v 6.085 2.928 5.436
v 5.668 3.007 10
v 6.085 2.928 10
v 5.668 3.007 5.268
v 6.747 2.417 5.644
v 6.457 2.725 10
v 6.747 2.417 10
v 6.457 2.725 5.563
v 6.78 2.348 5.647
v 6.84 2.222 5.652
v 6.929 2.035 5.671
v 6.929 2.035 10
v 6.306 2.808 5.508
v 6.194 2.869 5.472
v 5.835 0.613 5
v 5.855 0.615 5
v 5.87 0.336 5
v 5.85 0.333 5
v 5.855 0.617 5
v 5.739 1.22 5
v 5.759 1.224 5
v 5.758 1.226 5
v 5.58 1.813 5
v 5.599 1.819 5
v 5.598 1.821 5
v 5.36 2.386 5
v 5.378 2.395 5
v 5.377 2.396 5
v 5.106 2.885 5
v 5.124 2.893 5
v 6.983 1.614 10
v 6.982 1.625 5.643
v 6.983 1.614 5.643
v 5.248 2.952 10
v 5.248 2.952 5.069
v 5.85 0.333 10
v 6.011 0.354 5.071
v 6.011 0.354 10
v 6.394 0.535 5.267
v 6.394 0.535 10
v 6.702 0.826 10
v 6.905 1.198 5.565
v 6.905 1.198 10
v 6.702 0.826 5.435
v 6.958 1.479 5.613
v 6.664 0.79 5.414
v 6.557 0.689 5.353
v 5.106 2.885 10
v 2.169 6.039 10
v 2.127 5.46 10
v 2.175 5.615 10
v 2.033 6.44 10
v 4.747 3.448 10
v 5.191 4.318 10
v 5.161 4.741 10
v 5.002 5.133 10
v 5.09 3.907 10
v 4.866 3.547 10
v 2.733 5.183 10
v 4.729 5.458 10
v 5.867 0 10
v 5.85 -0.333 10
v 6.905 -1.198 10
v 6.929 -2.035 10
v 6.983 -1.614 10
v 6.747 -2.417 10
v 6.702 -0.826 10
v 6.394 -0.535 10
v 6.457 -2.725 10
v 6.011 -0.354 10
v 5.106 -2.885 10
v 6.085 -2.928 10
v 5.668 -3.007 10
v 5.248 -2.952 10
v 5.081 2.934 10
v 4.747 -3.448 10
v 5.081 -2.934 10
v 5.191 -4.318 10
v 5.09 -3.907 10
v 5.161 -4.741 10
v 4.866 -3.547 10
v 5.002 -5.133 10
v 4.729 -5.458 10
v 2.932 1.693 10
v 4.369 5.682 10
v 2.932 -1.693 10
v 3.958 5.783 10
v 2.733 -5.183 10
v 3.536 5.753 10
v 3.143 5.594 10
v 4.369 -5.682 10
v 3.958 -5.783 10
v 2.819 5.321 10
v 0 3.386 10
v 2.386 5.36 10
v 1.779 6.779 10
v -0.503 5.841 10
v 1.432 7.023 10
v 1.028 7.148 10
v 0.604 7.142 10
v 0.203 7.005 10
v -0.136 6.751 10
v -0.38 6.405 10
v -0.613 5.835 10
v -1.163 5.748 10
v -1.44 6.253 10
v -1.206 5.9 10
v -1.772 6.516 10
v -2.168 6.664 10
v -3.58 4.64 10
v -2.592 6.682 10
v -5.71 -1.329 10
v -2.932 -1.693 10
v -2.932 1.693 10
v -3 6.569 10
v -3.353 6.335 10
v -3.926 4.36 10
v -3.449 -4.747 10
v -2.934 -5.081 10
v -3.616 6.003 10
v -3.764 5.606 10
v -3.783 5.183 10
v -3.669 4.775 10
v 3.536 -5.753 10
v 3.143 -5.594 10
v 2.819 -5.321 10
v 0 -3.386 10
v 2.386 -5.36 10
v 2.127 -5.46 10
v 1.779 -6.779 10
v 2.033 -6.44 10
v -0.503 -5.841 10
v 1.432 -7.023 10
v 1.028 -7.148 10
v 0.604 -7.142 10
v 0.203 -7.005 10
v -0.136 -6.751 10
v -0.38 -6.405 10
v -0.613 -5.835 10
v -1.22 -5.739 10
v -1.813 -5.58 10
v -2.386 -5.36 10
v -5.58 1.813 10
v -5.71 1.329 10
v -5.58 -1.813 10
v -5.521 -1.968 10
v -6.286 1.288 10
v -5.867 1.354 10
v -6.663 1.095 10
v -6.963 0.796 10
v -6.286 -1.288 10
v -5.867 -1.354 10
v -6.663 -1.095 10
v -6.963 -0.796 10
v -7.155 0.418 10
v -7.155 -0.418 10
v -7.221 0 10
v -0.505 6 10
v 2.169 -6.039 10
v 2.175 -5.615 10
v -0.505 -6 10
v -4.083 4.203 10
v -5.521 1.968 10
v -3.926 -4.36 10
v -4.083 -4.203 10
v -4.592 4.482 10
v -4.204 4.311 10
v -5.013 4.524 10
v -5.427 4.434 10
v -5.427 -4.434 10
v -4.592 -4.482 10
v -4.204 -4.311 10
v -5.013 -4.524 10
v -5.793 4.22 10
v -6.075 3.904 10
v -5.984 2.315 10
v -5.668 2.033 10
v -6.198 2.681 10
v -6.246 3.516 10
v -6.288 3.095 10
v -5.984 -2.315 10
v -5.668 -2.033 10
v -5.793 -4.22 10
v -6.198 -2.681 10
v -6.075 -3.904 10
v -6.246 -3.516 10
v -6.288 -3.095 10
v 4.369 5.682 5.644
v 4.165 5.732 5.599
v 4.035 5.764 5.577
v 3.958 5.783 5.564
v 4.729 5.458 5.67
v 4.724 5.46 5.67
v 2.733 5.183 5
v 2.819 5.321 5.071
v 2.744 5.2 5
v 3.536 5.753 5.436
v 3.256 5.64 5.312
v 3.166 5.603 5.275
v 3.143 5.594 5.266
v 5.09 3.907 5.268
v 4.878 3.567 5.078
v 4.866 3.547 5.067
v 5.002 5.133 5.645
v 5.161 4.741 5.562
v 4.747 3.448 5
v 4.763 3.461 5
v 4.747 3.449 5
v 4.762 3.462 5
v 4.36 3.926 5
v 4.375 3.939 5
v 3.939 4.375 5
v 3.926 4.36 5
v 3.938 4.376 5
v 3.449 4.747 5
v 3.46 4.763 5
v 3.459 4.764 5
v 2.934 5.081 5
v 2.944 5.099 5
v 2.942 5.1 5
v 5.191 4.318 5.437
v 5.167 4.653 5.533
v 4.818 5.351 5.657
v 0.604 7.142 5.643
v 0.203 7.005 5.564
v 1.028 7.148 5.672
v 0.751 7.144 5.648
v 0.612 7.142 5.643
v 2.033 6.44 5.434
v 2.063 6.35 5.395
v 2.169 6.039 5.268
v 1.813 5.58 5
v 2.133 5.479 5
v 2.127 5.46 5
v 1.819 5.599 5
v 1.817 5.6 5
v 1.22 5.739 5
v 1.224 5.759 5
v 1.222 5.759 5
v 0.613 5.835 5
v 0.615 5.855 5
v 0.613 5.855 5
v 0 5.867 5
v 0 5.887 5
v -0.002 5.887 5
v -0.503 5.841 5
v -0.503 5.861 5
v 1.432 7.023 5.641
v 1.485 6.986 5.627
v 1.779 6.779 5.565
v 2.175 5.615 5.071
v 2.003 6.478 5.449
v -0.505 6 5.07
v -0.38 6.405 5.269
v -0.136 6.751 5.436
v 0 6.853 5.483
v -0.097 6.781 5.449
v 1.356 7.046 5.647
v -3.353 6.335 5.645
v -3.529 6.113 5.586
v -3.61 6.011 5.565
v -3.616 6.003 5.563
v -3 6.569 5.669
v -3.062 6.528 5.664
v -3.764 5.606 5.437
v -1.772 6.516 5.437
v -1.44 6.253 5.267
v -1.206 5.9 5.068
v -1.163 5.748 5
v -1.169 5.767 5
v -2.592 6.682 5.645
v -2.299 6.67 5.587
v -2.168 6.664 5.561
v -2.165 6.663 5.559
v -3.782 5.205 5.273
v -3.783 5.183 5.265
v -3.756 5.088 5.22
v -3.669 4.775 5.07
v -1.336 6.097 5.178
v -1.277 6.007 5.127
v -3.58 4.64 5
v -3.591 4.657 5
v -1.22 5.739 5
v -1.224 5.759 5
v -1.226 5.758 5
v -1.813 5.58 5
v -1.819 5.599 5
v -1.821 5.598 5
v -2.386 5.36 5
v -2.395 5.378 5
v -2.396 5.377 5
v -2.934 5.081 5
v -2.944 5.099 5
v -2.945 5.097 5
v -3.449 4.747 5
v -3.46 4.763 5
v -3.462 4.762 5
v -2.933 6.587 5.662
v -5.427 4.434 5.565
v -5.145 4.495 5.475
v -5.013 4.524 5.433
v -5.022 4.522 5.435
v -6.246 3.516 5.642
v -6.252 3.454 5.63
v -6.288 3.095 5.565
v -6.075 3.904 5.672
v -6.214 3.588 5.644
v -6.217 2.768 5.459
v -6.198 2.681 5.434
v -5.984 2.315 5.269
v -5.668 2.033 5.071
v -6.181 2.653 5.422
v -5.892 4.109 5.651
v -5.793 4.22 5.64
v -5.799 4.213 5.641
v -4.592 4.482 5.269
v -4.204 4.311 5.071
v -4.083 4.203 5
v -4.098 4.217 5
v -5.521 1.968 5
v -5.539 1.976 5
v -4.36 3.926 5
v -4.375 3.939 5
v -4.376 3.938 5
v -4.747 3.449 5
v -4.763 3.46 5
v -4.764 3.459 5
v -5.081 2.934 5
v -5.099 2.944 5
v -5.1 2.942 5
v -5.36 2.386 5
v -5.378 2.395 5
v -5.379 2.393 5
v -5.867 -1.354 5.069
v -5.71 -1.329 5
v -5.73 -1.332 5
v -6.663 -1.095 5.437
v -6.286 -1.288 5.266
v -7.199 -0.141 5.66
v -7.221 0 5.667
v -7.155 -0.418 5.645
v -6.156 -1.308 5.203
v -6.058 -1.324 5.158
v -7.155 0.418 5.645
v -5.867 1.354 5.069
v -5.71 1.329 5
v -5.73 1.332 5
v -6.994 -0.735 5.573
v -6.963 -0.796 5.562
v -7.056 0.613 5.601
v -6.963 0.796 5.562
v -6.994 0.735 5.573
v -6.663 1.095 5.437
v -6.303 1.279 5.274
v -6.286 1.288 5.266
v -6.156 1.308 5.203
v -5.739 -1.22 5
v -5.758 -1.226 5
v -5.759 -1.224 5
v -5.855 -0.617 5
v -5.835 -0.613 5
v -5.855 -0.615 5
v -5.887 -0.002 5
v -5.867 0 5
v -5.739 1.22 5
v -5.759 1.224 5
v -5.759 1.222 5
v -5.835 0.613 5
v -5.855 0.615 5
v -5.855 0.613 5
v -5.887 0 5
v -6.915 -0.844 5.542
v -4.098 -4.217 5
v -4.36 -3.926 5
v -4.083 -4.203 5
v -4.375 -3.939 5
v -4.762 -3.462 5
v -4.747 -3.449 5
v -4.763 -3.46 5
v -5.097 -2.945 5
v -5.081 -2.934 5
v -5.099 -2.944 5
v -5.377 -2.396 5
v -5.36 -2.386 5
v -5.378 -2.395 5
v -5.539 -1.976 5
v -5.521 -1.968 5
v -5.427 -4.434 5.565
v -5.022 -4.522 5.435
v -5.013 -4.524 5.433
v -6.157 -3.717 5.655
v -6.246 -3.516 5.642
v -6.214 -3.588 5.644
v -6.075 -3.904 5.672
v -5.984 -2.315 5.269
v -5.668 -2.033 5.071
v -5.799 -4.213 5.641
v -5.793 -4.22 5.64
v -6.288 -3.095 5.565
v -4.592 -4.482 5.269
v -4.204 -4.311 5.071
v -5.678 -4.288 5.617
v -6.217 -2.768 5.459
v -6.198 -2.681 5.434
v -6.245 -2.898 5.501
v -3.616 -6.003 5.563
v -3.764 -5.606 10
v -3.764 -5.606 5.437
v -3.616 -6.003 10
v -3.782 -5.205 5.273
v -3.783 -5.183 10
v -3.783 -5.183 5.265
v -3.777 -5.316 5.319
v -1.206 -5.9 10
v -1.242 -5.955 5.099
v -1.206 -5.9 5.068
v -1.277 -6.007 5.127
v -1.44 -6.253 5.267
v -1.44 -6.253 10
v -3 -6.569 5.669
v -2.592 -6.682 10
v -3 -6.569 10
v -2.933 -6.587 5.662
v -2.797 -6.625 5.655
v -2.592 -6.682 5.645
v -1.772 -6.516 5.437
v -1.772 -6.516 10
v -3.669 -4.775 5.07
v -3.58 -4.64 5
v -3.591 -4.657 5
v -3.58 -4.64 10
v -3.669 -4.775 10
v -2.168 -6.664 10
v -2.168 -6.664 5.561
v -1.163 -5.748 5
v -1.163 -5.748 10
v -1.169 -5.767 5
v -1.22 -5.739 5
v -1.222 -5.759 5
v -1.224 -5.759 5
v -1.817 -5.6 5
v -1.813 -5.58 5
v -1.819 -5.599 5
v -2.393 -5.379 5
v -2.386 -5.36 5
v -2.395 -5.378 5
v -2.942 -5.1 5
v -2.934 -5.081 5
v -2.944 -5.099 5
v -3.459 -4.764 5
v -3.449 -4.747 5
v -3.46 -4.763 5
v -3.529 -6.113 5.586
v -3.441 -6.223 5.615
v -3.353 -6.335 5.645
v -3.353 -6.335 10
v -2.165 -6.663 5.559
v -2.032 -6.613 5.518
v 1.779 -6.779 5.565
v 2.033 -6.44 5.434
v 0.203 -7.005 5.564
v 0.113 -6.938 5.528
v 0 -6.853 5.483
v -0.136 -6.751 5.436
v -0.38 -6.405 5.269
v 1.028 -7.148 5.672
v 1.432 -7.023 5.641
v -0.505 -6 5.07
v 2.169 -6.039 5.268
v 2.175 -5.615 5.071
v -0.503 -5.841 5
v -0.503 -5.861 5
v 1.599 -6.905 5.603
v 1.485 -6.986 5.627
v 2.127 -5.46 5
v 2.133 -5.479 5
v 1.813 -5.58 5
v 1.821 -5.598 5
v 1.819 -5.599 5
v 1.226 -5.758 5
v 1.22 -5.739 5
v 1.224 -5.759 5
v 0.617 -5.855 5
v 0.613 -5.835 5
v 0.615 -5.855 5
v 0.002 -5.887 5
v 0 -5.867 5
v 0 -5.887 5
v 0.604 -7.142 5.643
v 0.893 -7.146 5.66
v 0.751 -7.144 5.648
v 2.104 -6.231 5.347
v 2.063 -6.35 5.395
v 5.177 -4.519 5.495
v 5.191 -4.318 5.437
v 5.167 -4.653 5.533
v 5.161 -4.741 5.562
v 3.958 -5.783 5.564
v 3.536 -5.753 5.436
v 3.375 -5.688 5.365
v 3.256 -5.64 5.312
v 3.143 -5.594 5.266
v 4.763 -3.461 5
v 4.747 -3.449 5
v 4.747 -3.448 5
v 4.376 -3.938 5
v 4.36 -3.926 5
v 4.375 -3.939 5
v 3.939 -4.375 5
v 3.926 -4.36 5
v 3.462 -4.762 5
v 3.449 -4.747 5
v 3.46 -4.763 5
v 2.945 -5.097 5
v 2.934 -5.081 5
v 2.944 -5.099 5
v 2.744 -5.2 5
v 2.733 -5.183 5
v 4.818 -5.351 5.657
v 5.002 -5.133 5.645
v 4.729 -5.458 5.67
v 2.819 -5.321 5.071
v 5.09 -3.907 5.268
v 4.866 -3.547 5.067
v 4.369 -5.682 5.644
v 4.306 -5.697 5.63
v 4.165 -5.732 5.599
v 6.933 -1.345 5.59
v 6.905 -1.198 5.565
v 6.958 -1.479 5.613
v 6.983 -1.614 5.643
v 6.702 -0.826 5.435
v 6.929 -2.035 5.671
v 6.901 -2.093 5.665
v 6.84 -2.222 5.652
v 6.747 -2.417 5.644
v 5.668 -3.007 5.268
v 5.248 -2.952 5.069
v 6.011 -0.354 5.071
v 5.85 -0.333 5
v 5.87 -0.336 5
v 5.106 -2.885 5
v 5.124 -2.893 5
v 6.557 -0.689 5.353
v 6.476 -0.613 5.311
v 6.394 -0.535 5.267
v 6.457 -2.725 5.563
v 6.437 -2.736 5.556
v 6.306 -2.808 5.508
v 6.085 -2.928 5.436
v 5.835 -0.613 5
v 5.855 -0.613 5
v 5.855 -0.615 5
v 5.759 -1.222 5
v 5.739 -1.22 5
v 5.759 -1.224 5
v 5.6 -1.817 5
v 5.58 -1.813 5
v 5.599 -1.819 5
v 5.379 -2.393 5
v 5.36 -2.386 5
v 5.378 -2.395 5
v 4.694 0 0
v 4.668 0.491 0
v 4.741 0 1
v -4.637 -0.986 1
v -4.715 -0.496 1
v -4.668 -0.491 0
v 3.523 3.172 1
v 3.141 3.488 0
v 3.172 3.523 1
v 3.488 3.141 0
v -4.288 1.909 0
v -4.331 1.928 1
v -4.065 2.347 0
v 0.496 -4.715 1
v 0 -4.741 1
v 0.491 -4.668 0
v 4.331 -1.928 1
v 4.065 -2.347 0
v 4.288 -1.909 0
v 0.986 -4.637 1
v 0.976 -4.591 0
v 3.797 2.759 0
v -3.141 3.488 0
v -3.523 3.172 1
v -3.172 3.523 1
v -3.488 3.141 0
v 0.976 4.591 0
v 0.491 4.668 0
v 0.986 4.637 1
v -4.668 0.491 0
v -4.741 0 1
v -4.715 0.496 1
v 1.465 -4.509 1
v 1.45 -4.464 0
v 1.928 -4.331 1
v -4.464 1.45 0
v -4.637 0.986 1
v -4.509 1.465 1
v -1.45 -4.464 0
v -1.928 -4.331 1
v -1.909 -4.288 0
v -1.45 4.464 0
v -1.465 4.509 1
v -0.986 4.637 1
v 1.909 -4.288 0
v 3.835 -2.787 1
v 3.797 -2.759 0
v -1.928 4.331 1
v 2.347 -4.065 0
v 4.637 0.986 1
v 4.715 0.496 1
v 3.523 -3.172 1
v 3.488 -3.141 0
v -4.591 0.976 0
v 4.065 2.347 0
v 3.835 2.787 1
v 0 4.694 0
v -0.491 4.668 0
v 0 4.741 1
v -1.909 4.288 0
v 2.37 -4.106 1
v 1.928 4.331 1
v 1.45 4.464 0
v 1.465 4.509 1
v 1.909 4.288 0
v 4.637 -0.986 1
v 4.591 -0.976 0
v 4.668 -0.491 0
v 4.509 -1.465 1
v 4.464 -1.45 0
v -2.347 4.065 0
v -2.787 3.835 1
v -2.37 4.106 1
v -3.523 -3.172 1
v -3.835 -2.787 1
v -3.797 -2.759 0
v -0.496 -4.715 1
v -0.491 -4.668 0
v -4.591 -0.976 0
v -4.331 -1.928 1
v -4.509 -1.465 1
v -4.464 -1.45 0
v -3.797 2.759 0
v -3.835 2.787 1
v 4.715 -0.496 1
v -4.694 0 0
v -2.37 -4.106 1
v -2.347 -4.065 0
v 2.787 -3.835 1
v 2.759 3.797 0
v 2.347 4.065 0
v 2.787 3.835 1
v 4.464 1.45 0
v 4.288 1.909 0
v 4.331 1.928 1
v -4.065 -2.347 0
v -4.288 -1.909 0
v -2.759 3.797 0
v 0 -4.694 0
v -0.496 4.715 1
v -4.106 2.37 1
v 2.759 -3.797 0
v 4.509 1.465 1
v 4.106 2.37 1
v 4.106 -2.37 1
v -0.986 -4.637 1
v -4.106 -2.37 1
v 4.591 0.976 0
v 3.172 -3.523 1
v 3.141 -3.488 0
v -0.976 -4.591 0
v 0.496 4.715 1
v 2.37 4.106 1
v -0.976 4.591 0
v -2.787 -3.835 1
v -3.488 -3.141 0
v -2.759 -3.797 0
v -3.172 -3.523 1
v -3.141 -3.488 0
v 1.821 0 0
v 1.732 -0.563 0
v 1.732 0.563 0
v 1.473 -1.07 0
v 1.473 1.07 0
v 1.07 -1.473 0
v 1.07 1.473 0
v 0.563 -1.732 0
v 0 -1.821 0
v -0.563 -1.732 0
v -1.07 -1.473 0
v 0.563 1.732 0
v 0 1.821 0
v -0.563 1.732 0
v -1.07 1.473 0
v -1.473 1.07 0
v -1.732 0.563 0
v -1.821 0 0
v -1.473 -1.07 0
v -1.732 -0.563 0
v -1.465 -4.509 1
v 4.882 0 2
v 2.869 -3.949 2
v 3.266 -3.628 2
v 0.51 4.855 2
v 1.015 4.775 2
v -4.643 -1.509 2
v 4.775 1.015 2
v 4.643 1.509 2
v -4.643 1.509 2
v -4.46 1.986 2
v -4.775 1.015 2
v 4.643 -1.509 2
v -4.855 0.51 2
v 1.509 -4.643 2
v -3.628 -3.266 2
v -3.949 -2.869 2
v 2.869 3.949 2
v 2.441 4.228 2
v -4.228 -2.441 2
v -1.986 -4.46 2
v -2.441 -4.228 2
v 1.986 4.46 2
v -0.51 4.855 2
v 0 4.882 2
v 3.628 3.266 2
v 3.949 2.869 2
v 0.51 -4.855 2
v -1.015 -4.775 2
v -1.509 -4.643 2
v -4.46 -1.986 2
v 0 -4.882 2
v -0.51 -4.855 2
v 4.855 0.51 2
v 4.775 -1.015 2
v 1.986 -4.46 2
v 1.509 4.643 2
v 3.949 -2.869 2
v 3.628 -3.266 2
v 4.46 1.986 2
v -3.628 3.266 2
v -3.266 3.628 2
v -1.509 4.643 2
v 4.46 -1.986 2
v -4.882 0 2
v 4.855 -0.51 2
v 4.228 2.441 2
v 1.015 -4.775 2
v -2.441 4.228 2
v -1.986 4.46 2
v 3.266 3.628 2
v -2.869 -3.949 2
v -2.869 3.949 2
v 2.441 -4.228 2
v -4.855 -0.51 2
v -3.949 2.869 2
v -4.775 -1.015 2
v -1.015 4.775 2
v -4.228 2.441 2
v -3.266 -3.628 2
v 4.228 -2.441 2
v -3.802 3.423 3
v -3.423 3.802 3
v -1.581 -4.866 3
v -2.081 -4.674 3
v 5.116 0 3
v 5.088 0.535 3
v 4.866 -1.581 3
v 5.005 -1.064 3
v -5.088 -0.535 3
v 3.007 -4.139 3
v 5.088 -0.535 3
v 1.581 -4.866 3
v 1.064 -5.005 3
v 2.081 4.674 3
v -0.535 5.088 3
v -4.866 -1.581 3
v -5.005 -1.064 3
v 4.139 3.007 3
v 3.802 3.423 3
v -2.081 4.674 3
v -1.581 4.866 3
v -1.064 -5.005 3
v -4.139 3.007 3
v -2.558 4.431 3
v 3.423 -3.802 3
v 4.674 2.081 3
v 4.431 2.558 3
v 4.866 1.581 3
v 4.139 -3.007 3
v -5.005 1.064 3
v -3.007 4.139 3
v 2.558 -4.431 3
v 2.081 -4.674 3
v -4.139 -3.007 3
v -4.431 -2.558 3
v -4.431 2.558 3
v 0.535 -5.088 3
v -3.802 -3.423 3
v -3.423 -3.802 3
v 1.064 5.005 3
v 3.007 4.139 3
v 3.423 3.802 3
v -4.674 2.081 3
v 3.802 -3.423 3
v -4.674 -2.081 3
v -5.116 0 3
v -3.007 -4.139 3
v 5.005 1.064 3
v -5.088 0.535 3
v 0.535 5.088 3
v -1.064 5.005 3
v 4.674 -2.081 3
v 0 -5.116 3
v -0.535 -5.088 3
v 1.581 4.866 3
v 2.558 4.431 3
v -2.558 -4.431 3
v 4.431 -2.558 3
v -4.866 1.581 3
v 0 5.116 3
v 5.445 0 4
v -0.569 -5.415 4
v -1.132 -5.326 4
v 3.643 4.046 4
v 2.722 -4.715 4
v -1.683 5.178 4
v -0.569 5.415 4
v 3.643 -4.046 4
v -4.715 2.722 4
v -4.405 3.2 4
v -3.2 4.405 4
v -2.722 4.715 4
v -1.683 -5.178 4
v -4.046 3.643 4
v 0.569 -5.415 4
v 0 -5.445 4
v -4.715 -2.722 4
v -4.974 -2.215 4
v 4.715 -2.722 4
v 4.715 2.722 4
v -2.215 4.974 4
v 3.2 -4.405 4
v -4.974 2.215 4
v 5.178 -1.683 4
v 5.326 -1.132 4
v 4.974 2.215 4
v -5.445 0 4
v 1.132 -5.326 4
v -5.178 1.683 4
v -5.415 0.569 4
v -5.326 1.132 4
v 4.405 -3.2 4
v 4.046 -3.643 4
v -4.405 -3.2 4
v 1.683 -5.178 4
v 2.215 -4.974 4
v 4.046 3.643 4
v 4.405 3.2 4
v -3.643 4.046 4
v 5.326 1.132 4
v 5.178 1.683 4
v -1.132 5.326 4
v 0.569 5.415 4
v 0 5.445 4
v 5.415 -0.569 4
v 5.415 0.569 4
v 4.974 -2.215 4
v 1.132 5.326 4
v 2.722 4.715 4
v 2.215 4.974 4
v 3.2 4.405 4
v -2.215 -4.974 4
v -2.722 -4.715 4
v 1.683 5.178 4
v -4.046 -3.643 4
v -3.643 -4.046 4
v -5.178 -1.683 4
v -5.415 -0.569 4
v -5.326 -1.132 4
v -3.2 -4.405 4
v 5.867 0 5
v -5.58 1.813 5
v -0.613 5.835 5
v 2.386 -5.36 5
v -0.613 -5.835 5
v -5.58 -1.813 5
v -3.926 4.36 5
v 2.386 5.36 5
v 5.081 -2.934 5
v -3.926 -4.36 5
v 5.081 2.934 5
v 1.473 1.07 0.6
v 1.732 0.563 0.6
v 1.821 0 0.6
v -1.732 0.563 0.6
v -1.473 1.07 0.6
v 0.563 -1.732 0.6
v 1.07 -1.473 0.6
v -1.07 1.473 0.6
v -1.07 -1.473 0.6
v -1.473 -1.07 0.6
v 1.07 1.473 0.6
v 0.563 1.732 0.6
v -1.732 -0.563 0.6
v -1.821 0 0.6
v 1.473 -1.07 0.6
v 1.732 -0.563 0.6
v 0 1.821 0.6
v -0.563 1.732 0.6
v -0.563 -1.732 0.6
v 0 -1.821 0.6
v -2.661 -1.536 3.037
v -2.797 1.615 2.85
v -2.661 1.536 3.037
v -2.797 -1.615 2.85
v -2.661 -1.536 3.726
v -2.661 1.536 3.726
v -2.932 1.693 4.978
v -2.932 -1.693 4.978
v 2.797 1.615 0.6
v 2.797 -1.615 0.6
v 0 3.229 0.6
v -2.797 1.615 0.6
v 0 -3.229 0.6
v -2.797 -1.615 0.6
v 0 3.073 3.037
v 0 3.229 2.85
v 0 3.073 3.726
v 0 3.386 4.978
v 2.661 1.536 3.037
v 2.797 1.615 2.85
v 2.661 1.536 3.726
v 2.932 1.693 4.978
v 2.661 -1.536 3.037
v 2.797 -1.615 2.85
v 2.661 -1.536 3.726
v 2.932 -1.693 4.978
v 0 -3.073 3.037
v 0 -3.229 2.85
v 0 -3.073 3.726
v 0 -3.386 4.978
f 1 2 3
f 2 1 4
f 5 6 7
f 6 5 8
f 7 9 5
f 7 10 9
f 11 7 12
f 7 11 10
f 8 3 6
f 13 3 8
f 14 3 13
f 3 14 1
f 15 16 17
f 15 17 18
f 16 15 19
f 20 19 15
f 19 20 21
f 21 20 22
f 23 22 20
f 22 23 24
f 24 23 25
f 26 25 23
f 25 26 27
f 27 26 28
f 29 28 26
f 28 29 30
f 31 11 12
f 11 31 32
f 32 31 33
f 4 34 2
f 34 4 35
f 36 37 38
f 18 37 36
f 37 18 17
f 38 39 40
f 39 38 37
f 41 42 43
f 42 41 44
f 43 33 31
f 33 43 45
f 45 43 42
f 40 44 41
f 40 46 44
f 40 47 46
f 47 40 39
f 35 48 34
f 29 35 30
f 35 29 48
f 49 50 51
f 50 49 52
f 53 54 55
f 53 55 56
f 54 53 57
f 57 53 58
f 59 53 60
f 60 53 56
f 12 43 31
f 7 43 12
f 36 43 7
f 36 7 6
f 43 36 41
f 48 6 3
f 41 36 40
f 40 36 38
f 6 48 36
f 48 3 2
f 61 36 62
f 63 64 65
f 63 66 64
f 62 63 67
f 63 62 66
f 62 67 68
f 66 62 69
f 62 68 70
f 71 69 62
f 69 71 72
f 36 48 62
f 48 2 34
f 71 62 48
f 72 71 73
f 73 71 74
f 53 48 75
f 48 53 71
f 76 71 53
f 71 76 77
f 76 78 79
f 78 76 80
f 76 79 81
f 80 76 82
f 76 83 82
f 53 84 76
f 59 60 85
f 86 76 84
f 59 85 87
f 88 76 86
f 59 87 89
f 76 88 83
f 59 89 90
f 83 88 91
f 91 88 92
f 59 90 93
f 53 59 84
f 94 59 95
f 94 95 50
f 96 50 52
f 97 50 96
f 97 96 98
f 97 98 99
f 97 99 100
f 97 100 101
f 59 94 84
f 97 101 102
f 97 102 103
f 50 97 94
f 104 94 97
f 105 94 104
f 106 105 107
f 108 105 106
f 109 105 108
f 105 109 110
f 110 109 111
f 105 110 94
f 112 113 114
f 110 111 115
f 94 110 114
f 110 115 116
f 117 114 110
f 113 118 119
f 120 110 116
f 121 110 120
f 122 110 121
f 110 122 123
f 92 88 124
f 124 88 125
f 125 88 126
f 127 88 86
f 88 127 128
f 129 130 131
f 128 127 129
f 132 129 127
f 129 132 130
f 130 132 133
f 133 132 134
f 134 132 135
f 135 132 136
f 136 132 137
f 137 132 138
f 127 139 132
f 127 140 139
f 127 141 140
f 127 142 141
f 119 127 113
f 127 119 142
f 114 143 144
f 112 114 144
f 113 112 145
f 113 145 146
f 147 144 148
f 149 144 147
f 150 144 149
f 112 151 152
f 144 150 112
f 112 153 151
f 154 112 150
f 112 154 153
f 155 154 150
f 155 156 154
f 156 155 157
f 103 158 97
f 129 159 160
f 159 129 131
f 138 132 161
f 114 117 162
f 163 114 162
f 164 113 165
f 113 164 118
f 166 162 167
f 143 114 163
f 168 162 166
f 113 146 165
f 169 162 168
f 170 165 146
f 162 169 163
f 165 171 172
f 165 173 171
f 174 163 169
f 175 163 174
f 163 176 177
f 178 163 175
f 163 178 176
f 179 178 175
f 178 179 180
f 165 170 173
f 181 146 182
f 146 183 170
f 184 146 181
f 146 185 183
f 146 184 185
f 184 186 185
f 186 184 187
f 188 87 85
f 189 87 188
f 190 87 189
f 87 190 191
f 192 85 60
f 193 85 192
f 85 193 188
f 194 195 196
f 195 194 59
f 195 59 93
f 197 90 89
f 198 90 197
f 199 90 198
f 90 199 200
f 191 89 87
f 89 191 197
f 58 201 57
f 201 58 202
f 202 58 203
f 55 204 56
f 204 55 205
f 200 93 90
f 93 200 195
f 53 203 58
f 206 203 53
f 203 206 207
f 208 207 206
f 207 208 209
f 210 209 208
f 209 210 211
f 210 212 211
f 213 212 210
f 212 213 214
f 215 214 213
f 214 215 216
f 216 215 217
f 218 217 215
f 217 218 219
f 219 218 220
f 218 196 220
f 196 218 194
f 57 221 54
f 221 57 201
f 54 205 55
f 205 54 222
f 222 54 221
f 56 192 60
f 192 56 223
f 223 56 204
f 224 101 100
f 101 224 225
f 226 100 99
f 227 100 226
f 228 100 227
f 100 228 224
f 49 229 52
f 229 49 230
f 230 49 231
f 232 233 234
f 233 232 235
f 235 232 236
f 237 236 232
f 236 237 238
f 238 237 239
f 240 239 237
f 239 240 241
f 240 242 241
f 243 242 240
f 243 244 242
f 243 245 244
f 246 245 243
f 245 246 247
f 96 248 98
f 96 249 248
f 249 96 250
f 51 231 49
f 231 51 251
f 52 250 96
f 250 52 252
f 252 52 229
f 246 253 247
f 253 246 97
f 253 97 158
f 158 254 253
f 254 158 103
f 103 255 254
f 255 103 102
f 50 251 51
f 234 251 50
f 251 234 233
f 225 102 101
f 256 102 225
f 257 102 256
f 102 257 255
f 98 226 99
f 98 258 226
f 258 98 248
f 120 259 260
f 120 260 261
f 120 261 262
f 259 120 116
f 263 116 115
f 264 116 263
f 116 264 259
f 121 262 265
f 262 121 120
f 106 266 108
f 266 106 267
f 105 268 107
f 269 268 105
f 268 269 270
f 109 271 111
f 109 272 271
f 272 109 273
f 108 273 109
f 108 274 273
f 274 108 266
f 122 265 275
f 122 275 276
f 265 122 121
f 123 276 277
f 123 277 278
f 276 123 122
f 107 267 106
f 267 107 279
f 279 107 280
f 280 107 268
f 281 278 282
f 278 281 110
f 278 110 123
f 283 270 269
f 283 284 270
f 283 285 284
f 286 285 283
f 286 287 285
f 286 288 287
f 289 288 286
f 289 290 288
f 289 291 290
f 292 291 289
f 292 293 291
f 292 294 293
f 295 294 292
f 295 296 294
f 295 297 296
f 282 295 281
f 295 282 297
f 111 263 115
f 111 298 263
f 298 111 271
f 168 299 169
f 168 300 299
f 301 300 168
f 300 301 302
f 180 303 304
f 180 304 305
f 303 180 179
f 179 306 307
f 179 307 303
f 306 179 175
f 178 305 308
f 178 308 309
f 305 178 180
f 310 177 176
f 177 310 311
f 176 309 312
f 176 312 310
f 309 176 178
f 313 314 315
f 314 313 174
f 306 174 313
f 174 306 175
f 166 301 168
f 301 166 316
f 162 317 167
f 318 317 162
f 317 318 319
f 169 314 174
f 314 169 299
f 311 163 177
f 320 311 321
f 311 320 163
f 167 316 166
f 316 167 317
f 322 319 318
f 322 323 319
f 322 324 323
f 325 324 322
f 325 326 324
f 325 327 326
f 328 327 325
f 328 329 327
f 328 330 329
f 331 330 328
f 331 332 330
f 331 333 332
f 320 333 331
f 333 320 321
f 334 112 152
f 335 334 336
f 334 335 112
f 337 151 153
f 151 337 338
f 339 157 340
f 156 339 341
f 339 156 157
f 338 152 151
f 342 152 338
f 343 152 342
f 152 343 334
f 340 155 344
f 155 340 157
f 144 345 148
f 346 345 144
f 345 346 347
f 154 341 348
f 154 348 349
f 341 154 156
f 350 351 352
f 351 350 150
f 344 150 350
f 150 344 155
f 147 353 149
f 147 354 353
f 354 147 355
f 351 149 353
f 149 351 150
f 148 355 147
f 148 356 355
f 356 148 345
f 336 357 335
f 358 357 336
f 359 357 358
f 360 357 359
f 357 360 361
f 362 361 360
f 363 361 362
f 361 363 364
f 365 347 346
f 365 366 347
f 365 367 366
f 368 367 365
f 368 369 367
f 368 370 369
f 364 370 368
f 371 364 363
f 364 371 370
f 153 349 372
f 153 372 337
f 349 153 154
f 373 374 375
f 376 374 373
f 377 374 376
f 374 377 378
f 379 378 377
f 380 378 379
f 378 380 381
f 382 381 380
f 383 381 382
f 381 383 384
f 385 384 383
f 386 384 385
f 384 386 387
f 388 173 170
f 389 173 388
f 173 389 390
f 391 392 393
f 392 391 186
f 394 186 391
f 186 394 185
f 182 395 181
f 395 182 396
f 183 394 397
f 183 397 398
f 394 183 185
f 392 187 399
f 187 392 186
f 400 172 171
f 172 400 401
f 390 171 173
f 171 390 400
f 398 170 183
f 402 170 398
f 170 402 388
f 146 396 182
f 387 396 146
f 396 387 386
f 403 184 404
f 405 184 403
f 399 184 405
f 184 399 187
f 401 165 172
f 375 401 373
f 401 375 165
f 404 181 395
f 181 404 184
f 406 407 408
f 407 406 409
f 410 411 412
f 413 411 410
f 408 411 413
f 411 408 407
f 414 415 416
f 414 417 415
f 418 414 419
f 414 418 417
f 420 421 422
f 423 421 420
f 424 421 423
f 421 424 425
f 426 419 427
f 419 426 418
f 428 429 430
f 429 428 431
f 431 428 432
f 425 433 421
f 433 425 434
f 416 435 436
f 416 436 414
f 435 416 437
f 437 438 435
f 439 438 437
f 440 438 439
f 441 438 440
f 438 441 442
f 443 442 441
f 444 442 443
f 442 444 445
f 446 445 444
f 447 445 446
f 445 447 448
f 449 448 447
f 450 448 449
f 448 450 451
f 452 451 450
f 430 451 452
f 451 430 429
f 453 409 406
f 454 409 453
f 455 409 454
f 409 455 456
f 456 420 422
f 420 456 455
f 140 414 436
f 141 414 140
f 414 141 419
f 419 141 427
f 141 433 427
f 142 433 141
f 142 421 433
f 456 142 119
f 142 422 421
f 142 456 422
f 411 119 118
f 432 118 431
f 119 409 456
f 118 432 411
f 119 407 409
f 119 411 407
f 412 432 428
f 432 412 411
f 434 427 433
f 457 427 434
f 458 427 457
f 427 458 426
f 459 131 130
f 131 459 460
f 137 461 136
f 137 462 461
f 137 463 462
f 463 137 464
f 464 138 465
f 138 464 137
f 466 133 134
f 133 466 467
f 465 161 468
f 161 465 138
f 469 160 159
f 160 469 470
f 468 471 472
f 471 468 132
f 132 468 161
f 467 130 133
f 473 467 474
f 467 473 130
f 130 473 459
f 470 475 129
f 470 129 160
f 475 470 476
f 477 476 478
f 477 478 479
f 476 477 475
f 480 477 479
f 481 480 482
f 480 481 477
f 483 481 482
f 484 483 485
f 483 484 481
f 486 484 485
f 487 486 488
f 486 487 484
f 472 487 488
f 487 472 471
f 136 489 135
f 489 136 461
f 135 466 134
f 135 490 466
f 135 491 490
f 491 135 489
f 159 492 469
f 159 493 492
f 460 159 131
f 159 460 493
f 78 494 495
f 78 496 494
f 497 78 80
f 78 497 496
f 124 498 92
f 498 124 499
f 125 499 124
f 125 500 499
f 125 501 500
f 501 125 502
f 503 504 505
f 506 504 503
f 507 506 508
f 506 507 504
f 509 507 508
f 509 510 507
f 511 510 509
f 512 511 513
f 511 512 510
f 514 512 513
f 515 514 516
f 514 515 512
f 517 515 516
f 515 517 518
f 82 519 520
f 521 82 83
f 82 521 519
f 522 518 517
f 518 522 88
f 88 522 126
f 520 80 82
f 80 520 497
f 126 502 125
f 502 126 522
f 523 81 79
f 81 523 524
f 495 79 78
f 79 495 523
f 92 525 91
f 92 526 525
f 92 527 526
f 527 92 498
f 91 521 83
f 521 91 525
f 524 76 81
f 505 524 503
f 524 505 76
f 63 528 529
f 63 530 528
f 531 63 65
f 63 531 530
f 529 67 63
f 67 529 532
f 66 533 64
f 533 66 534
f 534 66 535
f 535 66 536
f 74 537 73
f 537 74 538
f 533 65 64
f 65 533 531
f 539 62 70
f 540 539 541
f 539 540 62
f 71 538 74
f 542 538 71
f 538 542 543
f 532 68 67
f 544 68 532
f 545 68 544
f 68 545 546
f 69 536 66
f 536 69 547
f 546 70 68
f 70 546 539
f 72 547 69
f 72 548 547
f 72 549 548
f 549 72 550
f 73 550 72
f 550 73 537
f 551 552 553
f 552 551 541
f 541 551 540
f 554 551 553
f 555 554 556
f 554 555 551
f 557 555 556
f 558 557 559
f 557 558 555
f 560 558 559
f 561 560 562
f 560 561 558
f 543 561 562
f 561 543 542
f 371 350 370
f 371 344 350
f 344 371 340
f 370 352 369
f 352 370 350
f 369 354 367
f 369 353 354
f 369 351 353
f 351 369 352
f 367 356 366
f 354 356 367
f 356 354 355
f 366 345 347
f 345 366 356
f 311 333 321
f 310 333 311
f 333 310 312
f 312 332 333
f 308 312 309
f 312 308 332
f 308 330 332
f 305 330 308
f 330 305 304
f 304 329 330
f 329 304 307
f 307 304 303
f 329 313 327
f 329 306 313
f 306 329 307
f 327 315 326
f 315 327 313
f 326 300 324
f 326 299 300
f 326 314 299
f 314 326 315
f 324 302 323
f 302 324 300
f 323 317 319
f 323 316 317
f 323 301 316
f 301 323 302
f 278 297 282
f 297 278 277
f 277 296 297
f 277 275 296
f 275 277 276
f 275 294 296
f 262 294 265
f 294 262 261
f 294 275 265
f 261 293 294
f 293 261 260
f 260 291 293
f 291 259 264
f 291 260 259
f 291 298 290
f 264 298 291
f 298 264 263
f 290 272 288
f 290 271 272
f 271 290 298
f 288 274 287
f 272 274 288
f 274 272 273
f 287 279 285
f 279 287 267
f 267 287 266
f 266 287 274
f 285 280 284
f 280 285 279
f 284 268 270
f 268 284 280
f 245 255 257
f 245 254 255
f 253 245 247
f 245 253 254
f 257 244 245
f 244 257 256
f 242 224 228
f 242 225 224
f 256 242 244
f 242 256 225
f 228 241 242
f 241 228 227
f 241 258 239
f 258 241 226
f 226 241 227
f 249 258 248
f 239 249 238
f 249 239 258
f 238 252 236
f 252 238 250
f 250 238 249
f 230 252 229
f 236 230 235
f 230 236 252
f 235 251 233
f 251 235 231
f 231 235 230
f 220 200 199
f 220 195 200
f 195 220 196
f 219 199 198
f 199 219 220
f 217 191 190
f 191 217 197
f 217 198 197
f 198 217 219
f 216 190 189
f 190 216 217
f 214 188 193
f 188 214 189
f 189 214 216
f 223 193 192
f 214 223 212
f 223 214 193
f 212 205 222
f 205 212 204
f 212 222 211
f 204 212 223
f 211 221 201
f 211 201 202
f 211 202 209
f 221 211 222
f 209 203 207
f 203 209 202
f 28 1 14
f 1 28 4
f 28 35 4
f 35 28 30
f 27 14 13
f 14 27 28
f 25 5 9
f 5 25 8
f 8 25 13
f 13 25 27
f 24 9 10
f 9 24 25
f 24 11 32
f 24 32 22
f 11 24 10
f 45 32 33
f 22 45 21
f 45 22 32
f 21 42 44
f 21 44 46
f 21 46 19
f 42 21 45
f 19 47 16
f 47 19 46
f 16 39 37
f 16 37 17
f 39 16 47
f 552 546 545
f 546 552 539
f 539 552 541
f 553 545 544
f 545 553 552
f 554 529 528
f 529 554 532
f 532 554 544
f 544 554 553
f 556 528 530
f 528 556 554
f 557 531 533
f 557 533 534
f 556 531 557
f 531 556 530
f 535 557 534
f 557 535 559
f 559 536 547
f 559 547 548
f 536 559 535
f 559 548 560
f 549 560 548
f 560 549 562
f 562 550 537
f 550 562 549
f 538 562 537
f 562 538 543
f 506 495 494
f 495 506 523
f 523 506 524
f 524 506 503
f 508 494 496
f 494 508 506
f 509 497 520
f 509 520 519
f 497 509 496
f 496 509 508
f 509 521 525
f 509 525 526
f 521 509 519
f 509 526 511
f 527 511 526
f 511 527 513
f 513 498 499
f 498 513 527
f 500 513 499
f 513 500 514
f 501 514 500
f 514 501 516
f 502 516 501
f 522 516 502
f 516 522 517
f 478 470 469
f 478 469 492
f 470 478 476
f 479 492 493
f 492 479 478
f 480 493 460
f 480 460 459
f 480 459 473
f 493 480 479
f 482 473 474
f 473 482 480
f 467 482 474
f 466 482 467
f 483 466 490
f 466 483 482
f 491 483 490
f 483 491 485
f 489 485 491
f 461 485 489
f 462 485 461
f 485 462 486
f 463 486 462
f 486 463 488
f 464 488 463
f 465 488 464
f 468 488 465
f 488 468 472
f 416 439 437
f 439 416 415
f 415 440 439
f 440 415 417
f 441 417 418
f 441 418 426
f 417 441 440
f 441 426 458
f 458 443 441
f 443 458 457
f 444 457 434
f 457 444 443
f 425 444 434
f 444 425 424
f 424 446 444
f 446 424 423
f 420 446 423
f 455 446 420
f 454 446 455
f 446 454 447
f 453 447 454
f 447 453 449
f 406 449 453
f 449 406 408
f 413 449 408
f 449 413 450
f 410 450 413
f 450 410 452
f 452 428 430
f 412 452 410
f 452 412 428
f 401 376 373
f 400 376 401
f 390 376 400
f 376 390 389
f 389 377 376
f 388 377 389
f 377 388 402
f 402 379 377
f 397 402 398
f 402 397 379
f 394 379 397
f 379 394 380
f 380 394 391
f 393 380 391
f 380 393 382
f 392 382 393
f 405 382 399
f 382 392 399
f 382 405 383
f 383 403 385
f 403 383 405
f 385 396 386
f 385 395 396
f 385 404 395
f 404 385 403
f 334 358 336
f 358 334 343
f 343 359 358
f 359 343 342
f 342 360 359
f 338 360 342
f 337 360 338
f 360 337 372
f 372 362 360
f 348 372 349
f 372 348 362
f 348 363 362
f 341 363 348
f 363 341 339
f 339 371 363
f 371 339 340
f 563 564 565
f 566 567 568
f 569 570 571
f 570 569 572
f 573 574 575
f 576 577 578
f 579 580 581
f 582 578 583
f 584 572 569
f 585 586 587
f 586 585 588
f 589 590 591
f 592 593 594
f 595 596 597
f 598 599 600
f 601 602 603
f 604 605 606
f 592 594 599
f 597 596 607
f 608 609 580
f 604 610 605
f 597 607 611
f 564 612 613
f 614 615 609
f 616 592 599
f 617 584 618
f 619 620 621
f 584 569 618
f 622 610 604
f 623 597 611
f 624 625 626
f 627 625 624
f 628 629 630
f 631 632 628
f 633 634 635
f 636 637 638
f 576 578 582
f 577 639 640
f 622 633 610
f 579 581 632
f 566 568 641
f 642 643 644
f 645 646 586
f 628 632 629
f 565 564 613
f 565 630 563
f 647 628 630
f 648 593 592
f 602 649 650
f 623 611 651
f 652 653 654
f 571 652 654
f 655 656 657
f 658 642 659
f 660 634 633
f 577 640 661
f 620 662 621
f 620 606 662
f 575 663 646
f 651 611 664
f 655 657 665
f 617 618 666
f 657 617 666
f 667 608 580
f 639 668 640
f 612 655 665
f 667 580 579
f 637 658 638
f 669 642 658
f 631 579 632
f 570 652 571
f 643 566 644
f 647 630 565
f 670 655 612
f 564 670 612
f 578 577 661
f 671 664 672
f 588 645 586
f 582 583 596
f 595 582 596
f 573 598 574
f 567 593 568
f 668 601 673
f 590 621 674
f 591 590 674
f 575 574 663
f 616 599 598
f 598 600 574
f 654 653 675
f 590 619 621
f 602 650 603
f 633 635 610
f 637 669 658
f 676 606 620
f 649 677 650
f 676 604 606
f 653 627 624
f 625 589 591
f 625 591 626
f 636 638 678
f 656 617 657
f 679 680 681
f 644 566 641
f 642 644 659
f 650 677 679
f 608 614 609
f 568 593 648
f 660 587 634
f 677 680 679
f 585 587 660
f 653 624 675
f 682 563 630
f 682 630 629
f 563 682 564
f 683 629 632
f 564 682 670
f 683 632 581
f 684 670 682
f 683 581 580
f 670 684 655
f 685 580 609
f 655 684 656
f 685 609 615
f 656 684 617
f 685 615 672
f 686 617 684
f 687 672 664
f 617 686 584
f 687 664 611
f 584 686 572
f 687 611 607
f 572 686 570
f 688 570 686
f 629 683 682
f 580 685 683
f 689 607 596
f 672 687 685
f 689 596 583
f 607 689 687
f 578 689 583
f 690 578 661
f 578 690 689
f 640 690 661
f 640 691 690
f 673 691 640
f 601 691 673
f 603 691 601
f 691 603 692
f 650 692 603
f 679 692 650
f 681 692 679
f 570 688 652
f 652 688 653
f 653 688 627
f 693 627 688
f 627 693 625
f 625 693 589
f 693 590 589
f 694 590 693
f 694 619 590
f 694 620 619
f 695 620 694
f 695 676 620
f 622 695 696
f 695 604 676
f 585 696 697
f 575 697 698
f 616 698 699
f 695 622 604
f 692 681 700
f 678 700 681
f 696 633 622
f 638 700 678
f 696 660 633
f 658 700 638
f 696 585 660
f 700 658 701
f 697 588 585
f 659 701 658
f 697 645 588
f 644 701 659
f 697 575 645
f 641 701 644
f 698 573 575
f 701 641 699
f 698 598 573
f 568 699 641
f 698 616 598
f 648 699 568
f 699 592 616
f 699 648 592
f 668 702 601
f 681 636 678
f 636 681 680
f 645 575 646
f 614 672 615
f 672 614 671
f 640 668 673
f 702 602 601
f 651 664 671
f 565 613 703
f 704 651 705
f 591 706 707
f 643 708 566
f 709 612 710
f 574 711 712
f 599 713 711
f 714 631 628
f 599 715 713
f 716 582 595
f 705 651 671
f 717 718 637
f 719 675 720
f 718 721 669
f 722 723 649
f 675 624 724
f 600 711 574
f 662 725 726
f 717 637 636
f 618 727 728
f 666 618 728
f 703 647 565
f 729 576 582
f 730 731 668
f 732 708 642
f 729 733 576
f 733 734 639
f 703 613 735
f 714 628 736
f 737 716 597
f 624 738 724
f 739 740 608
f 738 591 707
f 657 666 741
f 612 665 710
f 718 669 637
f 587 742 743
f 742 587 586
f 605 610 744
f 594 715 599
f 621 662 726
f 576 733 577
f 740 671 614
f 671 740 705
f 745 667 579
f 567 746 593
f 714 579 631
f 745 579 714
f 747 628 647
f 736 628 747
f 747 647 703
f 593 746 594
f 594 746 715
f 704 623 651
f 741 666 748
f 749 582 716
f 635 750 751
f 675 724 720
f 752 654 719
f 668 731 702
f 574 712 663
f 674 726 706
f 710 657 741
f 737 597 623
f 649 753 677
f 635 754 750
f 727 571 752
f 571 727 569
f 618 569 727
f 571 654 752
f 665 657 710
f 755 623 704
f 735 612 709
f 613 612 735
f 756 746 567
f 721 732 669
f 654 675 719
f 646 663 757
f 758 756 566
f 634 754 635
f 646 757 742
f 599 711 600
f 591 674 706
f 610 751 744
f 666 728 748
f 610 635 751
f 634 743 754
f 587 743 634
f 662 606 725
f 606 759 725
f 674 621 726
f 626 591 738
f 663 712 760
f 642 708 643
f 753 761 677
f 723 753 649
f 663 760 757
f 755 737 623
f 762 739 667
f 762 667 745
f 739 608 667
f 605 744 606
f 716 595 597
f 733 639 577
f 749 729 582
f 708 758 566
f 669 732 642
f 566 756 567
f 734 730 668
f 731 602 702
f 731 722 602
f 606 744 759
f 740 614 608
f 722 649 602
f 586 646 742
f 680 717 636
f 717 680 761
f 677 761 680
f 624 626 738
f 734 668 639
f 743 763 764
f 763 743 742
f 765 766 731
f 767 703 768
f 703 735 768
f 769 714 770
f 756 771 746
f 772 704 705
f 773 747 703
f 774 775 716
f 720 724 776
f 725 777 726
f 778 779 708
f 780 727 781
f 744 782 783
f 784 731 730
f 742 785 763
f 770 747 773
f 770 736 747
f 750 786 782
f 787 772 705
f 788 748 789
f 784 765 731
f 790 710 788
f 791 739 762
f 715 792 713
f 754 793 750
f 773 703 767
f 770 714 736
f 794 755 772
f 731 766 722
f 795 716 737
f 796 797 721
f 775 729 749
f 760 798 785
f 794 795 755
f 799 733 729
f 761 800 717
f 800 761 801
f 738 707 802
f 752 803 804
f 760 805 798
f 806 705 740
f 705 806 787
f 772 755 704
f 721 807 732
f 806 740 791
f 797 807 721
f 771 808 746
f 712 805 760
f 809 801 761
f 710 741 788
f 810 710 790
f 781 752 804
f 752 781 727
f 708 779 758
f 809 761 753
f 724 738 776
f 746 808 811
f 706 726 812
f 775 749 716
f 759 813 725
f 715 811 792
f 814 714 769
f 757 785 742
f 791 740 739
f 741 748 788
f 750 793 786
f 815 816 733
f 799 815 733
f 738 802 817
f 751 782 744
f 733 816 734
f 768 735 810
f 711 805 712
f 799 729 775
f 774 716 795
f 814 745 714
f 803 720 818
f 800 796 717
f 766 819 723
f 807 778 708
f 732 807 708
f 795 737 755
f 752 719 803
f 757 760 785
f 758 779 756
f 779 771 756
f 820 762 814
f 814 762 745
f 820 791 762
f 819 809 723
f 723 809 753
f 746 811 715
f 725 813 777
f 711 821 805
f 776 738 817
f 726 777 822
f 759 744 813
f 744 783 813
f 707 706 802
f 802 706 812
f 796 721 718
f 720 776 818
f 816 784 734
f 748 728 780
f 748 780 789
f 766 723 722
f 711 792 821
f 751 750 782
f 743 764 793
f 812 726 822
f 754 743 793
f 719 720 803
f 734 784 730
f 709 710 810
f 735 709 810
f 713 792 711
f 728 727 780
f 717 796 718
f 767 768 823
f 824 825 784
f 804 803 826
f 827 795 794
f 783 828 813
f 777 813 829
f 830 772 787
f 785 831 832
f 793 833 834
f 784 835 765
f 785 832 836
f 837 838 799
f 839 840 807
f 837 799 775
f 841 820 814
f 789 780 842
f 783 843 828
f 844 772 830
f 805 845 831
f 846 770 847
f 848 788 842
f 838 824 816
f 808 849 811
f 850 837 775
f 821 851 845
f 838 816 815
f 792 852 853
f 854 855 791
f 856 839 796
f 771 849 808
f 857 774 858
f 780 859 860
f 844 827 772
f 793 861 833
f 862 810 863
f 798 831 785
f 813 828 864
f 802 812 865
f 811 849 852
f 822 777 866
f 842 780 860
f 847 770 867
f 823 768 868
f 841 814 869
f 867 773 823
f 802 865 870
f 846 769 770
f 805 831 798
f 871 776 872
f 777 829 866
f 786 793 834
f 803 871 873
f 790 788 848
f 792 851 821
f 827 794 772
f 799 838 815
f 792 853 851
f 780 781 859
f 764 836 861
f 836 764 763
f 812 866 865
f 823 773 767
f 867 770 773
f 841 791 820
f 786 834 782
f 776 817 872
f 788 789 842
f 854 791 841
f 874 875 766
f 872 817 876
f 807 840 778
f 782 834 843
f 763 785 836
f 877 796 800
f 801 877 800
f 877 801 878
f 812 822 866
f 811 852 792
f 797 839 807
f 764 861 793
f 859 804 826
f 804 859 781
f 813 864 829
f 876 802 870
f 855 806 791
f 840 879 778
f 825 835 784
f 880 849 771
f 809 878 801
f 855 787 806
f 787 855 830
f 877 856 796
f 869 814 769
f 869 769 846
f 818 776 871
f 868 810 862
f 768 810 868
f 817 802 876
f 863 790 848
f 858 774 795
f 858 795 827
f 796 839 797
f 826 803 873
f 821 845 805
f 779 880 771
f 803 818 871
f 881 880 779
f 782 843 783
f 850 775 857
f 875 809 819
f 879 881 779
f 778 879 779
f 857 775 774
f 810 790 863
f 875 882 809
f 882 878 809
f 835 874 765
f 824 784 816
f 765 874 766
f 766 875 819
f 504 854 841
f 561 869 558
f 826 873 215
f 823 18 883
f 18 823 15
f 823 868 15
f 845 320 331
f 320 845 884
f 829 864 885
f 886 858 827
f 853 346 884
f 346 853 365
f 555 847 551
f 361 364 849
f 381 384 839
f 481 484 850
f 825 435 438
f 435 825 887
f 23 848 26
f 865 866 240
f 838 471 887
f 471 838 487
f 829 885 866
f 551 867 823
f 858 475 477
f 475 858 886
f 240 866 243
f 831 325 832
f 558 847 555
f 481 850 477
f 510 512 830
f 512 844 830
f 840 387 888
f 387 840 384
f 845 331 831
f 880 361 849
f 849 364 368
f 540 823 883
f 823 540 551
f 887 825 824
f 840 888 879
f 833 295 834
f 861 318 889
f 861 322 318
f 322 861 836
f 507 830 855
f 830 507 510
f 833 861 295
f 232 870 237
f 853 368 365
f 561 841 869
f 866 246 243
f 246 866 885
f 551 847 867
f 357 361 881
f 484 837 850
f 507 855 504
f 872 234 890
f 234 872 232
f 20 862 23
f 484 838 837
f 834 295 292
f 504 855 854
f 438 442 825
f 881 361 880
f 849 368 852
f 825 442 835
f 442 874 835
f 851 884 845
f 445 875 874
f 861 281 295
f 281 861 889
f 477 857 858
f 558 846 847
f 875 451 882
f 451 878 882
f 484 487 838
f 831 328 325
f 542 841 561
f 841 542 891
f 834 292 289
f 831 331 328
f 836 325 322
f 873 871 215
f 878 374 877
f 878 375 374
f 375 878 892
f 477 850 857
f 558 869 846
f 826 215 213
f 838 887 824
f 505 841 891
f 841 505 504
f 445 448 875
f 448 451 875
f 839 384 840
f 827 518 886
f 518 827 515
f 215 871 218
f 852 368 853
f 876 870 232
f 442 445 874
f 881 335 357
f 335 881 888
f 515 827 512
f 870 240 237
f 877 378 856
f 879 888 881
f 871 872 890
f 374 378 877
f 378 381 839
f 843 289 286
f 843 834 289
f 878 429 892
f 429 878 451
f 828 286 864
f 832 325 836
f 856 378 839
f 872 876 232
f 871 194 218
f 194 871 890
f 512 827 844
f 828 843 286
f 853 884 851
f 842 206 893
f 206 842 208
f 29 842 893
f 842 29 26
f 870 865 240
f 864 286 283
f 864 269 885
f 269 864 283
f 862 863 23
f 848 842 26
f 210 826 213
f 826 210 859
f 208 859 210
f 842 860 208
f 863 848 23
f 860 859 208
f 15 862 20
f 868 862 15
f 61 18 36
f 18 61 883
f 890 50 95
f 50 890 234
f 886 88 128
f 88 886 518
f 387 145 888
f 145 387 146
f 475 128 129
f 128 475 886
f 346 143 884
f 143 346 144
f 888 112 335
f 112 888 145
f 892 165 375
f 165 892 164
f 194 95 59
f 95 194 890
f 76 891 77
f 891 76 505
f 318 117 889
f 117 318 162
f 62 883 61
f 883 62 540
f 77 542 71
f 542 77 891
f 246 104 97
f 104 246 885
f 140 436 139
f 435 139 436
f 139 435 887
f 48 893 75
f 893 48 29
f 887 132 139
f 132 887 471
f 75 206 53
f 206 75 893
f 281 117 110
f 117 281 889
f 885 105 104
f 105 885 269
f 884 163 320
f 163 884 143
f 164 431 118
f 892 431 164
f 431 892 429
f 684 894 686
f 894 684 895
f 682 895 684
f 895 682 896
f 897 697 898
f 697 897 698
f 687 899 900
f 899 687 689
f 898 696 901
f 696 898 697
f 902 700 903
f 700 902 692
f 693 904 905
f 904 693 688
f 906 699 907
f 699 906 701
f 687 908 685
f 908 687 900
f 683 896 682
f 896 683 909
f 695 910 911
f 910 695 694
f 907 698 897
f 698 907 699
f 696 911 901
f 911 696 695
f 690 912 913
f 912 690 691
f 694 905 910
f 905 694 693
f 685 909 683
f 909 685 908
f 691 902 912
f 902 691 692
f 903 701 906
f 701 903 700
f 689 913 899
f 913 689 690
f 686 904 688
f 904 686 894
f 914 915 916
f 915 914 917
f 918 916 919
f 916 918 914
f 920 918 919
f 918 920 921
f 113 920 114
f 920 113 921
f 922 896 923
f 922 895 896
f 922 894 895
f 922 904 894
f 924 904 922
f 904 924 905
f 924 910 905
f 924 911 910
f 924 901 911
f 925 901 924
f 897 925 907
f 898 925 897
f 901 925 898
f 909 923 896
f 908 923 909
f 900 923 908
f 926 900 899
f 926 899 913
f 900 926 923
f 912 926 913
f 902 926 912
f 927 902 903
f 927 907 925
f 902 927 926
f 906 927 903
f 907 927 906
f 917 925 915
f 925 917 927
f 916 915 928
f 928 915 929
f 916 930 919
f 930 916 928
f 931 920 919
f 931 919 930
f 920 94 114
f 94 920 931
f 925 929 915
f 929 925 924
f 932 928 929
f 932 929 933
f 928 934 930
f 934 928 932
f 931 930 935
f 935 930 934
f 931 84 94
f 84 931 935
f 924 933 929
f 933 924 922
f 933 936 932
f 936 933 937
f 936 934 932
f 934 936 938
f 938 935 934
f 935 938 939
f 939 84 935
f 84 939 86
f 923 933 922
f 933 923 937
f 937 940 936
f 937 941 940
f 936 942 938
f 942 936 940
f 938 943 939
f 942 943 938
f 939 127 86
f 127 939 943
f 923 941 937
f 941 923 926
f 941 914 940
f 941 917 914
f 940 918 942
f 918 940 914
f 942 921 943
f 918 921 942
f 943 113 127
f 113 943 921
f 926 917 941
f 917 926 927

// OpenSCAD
// 'Ultimate Nut Knob Generator' by wstein 
// is licensed under the Attribution - Non-Commercial - Share Alike license. 
// Version 1.5 (c) April 2015
// please refer the complete license here: http://creativecommons.org/licenses/by-nc-sa/3.0/legalcoe
//
// V1.1: some smaller improvements and new parameter "supportless_friendly" and "screw_hole_length"
// V1.2: flip very long knobs (miniature hex handle) and new hex shape
// V1.5: new support of tetragon up to octagon nuts
//       new wing shape
//       error in calulation of nuts fixed (relevant on bigger ones)
// V1.5.1: Global fix for latest Customizer

// preview[view:west, tilt:top diagonal]

//to show in Customizer - you get always all parts!
part = "cylindrical"; // [hex,simple,cylindrical,clamp,rounded,wing]

//across flats (M3 = 5.42, Allen = 6.35)
nut_width = 5.42;
nut_thickness = 2.5;

//of knob
height=10;

// in percent of knob height
knurled_height=50; //[10:100]

/*[Advanced]*/
echo("nut_diameter",nut_diameter);

// calculated relative to hex nut diameter
diameter_1=150; //[100:300]
function get_diameter_1()=hex_nut_diameter*diameter_1/100;

// in percent of Diameter 1 
diameter_2=125; //[100:200]
function get_diameter_2()=get_diameter_1()*diameter_2/100;

// in percent of nut diameter
screw_hole_diameter = 55; //[0:100]
function get_screw_hole_diameter()=nut_diameter*screw_hole_diameter/100;

// in percent of knob height
screw_hole_length = 100; //[0:100]
function get_screw_hole_length()=height*screw_hole_length/100;

// should be multiple of layer thickness (0.6 should be perfect for 0.1, 0.2, 0.3mm layer thickness). Use 0 for open bottom like the screwdriver handle
bottom_thickness = 0.6;

/*[Knurled]*/
//no effect on wing style
knurled_density=50; //[0:100]

knurled_strong=5;//[1:20]

/*[Expert]*/

//- tetragon=4, pentagon=5, hexagon=6, octagon=8
nut_sides=6;//[4,5,6,8]

// prevented some extreme overhangs
supportless_friendly=1; //[0:false,1:true]

//increase if it fits to tight
backlash=0.1;

cross_section=0; //[0:false,1:true]

/*[Hidden]*/
function get_knurled_n()= (
    part=="hex" ? 6 : (
    part=="wing" ? 2 : (
    round(sqrt(10*get_diameter_2())*get_knurled_density_factor()))));
    
function get_knurled_density_factor()=pow(10,knurled_density/50-1);
echo("get_knurled_density_factor()", get_knurled_density_factor());

nut_diameter = nut_width/cos(360/nut_sides/2);
hex_nut_diameter = nut_width/cos(360/6/2);

knurled_r=sqrt(10*get_diameter_2())/40*knurled_strong;

h1=height-height*knurled_height/100;
hlist=[0,h1/5,h1*2/5,h1*3/5,h1*4/5,h1,height];
rstep=[0,pow(0.2,2),pow(0.4,2),pow(0.6,2),pow(0.8,2),pow(1.0,2),pow(1.0,2)];
rlist=rstep*(get_diameter_2()-get_diameter_1());

if(height-h1-2.1*knurled_r>0||part!="rounded")
rotate(nut_width*5<height?[0,90,0]:(bottom_thickness==0.0?[180,0,0]:[0,0,0]))
union()
{
	difference()
	{
		union()
		{
			create_knurled();
	
			for(n=[0:5])
			translate([0,0,hlist[n]])
			cylinder(r1=(get_diameter_1()+rlist[n])/2,r2=(get_diameter_1()+rlist[n+1])/2,h=hlist[n+1]-hlist[n],$fn=60);
		}
	
		if(get_screw_hole_diameter()>0&&screw_hole_length>0)
		translate([0,0,-.1])
		cylinder(r=get_screw_hole_diameter()/2+backlash,h=get_screw_hole_length()+.11,$fn=20);

		assign(r1=1.0*nut_diameter/2+backlash)
		assign(r2=0.95*nut_diameter/2+backlash)
		assign(r3=1.05*nut_diameter/2+backlash)
		assign(h1=bottom_thickness)
		assign(h2=h1+nut_thickness-0.04*nut_diameter)
		assign(h3=h1+nut_thickness-0.01*nut_diameter)
		assign(h30=h1+nut_thickness)
		assign(h4=h1+nut_thickness+.1*nut_diameter)
		assign(h5=h4+.2*nut_diameter)
		assign(h6=max(h5,height))
        rotate([0,0,360/nut_sides/2])
		rotate_extrude($fn=nut_sides)
		if(bottom_thickness>0)
		polygon(points=[[r1,h1],[r1,h2],[r2,h3],[r2,h4],[r3,h5],[r3,h6+.1],[0,h6+.1],[0,h1]]);
		else
		polygon(points=[[r1,h1-.1],[r1,h30],[0,h30],[0,h1]]);
	
		if(cross_section)
		translate([-1000/2,0,-.1])
		cube([1000,1000,100]);
	}
}
else
for(a=[-45,45])
rotate([0,0,a])
cube([1,10,0.2],center=true);

module create_knurled()
translate([0,0,h1])
difference()
{
	if(part=="simple")
	create_simple_knurled();
	else if(part=="hex")
    hull()
	create_shaped_knurled();
	else if(part=="clamp")
	create_knurled_clamp();
    else if(part=="wing")
    create_wings();
	else
	create_shaped_knurled();

	assign(points=[[get_diameter_2()/2,-.01],[get_diameter_2()/2+1000,1000/2],[get_diameter_2()/2+1000,-.01]])
	if(part!="rounded"&&bottom_thickness!=0.0&&supportless_friendly==1)
	rotate_extrude($fn=60)
	polygon(points);
}

module create_knurled_clamp()
difference()
{
	cylinder(r=(2*knurled_r+get_diameter_2())/2,h=height-h1,$fn=60);

	for(a=[0:get_knurled_n()-1])
	rotate(360/get_knurled_n()*a)
	translate([get_diameter_2()/2+knurled_r,0,-.1])
	cylinder(r=knurled_r,h=height-h1+.2,$fn=30);
}

module create_simple_knurled(fn=4)
assign(n=round(get_knurled_n()/2))
for(a=[0:n-1])
rotate(360/fn/n*(a+.5))
cylinder(r=(2*knurled_r+get_diameter_2())/2,h=height-h1,$fn=fn);

module create_shaped_knurled()
for(a=[0:get_knurled_n()-1])
rotate(360/get_knurled_n()*(a+.5))
translate([get_diameter_2()/2,0,0])
if(part=="rounded"||part=="hex")
hull()
create_knurled_rounded();
else if(part=="cylindrical")
create_knurled_cylindrical();

module create_knurled_rounded()
for(z=[knurled_r,height-h1-knurled_r])
translate([0,0,z])
sphere(r=knurled_r,$fn=20);

module create_knurled_cylindrical()
cylinder(r=knurled_r,h=height-h1,$fn=20);

module create_wings()
assign(len=knurled_r*get_diameter_2()*.7)
linear_extrude(height=height-h1,convexity=20)
hull()
{
    circle(r=get_diameter_2()/2,$fn=60);
        
    for(a=[0:1])
    rotate(360/get_knurled_n()*(a+.5))
    translate([len,0,0])
    circle(r=get_diameter_2()/4,$fn=30);
}
